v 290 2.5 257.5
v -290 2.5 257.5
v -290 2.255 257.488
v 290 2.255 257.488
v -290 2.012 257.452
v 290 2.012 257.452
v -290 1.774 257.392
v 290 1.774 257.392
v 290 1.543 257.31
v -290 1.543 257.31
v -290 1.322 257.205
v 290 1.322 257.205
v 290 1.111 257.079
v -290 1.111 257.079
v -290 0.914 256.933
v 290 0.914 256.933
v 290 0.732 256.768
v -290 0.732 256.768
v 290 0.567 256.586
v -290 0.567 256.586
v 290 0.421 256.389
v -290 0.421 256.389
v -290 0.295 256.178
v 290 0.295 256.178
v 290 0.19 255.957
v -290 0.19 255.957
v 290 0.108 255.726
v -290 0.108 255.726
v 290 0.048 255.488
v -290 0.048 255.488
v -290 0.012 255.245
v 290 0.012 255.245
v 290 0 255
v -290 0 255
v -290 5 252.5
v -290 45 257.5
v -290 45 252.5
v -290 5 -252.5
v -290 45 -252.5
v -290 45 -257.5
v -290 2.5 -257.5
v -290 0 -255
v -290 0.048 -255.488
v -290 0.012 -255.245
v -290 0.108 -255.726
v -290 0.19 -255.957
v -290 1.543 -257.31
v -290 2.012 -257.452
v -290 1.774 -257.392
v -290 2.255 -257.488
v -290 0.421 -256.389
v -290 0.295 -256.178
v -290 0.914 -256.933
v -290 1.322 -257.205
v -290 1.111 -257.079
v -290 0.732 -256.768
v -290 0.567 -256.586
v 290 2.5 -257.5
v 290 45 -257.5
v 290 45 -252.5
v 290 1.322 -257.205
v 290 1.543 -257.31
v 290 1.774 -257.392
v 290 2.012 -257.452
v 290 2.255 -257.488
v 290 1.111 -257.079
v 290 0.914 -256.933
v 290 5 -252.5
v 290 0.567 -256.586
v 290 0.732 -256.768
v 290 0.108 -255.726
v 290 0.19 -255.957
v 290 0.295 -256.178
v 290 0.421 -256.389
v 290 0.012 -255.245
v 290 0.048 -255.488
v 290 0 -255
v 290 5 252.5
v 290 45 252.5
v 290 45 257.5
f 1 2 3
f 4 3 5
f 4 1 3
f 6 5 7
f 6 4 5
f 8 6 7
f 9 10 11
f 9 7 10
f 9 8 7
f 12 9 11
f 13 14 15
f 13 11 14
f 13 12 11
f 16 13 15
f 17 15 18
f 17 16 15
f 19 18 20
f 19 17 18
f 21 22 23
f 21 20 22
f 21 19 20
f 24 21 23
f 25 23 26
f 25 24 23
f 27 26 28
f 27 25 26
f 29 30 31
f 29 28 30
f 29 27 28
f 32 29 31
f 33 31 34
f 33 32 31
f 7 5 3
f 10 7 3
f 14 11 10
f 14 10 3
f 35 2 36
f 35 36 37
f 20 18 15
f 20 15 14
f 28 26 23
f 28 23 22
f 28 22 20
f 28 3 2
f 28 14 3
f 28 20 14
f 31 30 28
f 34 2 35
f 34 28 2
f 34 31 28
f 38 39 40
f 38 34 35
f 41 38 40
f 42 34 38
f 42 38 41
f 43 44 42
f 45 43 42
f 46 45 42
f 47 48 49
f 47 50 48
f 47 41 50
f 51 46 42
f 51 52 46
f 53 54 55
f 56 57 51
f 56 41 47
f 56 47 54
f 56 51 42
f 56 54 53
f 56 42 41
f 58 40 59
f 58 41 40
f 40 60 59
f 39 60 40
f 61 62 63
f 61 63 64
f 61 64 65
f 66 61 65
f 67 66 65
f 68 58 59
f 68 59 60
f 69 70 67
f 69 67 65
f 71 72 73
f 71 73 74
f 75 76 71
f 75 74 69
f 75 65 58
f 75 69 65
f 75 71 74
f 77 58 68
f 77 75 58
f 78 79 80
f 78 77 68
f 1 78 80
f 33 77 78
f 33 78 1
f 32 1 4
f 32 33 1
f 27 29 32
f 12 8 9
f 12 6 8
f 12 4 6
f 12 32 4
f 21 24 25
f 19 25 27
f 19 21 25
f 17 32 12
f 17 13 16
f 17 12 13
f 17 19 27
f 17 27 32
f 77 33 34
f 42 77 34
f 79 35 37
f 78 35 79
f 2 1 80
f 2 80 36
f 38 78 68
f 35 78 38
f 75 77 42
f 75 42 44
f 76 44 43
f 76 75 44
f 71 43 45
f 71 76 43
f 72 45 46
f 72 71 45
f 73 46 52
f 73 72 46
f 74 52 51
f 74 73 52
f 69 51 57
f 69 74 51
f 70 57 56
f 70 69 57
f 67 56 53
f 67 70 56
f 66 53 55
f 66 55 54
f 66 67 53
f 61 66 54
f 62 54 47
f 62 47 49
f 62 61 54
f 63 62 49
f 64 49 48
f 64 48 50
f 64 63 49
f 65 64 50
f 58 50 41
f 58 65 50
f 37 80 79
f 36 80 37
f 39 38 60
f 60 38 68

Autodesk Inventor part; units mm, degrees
ref_plane "YZ Plane" through (0, 0, 0) normal (1, 0, 0) x (0, 1, 0)
ref_plane "XZ Plane" through (0, 0, 0) normal (0, 1, 0) x (-1, 0, 0)
ref_plane "XY Plane" through (0, 0, 0) normal (0, 0, 1) x (1, 0, 0)
sketch "スケッチ1" plane through (0, 0, 0) normal (0, 1, 0) x (-1, 0, 0)
  line L0 (-290, 257.5) -> (290, 257.5)
  line L1 (290, 257.5) -> (290, -257.5)
  line L2 (290, -257.5) -> (-290, -257.5)
  line L3 (-290, -257.5) -> (-290, 257.5)
  line L4 (-290, 257.5) -> (290, -257.5) construction
  line L5 (290, 257.5) -> (-290, -257.5) construction
  line L6 (285, 257.5) -> (285, -257.5)
  line L7 (290, -252.5) -> (-290, -252.5)
  line L8 (290, 252.5) -> (-290, 252.5)
  point P0 (0, 0)
  dimension "d0" = 580
  dimension "d1" = 515
  dimension "d2" = 5
  dimension "d3" = 5
  dimension "d4" = 5
extrude "押し出し1" add sketch "スケッチ1" along normal blind 45 contours L0 L6 L8 L3 | L0 L1 L8 L6 | L7 L6 L2 L3 | L7 L1 L2 L6
extrude "押し出し2" add sketch "スケッチ1" along normal blind 5 contours L0 L6 L8 L3 | L8 L6 L7 L3 | L7 L6 L2 L3
fillet "フィレット1" radius 2.5 1 edges at (0, 0, -257.5)
fillet "フィレット2" radius 2.5 1 edges at (0, 0, 257.5)
extrude "押し出し3" add sketch "スケッチ1" along normal blind 5 contours L8 L6 L7 L3 | L8 L1 L7 L6
properties part number "controller_table" material "ステンレス鋼"
